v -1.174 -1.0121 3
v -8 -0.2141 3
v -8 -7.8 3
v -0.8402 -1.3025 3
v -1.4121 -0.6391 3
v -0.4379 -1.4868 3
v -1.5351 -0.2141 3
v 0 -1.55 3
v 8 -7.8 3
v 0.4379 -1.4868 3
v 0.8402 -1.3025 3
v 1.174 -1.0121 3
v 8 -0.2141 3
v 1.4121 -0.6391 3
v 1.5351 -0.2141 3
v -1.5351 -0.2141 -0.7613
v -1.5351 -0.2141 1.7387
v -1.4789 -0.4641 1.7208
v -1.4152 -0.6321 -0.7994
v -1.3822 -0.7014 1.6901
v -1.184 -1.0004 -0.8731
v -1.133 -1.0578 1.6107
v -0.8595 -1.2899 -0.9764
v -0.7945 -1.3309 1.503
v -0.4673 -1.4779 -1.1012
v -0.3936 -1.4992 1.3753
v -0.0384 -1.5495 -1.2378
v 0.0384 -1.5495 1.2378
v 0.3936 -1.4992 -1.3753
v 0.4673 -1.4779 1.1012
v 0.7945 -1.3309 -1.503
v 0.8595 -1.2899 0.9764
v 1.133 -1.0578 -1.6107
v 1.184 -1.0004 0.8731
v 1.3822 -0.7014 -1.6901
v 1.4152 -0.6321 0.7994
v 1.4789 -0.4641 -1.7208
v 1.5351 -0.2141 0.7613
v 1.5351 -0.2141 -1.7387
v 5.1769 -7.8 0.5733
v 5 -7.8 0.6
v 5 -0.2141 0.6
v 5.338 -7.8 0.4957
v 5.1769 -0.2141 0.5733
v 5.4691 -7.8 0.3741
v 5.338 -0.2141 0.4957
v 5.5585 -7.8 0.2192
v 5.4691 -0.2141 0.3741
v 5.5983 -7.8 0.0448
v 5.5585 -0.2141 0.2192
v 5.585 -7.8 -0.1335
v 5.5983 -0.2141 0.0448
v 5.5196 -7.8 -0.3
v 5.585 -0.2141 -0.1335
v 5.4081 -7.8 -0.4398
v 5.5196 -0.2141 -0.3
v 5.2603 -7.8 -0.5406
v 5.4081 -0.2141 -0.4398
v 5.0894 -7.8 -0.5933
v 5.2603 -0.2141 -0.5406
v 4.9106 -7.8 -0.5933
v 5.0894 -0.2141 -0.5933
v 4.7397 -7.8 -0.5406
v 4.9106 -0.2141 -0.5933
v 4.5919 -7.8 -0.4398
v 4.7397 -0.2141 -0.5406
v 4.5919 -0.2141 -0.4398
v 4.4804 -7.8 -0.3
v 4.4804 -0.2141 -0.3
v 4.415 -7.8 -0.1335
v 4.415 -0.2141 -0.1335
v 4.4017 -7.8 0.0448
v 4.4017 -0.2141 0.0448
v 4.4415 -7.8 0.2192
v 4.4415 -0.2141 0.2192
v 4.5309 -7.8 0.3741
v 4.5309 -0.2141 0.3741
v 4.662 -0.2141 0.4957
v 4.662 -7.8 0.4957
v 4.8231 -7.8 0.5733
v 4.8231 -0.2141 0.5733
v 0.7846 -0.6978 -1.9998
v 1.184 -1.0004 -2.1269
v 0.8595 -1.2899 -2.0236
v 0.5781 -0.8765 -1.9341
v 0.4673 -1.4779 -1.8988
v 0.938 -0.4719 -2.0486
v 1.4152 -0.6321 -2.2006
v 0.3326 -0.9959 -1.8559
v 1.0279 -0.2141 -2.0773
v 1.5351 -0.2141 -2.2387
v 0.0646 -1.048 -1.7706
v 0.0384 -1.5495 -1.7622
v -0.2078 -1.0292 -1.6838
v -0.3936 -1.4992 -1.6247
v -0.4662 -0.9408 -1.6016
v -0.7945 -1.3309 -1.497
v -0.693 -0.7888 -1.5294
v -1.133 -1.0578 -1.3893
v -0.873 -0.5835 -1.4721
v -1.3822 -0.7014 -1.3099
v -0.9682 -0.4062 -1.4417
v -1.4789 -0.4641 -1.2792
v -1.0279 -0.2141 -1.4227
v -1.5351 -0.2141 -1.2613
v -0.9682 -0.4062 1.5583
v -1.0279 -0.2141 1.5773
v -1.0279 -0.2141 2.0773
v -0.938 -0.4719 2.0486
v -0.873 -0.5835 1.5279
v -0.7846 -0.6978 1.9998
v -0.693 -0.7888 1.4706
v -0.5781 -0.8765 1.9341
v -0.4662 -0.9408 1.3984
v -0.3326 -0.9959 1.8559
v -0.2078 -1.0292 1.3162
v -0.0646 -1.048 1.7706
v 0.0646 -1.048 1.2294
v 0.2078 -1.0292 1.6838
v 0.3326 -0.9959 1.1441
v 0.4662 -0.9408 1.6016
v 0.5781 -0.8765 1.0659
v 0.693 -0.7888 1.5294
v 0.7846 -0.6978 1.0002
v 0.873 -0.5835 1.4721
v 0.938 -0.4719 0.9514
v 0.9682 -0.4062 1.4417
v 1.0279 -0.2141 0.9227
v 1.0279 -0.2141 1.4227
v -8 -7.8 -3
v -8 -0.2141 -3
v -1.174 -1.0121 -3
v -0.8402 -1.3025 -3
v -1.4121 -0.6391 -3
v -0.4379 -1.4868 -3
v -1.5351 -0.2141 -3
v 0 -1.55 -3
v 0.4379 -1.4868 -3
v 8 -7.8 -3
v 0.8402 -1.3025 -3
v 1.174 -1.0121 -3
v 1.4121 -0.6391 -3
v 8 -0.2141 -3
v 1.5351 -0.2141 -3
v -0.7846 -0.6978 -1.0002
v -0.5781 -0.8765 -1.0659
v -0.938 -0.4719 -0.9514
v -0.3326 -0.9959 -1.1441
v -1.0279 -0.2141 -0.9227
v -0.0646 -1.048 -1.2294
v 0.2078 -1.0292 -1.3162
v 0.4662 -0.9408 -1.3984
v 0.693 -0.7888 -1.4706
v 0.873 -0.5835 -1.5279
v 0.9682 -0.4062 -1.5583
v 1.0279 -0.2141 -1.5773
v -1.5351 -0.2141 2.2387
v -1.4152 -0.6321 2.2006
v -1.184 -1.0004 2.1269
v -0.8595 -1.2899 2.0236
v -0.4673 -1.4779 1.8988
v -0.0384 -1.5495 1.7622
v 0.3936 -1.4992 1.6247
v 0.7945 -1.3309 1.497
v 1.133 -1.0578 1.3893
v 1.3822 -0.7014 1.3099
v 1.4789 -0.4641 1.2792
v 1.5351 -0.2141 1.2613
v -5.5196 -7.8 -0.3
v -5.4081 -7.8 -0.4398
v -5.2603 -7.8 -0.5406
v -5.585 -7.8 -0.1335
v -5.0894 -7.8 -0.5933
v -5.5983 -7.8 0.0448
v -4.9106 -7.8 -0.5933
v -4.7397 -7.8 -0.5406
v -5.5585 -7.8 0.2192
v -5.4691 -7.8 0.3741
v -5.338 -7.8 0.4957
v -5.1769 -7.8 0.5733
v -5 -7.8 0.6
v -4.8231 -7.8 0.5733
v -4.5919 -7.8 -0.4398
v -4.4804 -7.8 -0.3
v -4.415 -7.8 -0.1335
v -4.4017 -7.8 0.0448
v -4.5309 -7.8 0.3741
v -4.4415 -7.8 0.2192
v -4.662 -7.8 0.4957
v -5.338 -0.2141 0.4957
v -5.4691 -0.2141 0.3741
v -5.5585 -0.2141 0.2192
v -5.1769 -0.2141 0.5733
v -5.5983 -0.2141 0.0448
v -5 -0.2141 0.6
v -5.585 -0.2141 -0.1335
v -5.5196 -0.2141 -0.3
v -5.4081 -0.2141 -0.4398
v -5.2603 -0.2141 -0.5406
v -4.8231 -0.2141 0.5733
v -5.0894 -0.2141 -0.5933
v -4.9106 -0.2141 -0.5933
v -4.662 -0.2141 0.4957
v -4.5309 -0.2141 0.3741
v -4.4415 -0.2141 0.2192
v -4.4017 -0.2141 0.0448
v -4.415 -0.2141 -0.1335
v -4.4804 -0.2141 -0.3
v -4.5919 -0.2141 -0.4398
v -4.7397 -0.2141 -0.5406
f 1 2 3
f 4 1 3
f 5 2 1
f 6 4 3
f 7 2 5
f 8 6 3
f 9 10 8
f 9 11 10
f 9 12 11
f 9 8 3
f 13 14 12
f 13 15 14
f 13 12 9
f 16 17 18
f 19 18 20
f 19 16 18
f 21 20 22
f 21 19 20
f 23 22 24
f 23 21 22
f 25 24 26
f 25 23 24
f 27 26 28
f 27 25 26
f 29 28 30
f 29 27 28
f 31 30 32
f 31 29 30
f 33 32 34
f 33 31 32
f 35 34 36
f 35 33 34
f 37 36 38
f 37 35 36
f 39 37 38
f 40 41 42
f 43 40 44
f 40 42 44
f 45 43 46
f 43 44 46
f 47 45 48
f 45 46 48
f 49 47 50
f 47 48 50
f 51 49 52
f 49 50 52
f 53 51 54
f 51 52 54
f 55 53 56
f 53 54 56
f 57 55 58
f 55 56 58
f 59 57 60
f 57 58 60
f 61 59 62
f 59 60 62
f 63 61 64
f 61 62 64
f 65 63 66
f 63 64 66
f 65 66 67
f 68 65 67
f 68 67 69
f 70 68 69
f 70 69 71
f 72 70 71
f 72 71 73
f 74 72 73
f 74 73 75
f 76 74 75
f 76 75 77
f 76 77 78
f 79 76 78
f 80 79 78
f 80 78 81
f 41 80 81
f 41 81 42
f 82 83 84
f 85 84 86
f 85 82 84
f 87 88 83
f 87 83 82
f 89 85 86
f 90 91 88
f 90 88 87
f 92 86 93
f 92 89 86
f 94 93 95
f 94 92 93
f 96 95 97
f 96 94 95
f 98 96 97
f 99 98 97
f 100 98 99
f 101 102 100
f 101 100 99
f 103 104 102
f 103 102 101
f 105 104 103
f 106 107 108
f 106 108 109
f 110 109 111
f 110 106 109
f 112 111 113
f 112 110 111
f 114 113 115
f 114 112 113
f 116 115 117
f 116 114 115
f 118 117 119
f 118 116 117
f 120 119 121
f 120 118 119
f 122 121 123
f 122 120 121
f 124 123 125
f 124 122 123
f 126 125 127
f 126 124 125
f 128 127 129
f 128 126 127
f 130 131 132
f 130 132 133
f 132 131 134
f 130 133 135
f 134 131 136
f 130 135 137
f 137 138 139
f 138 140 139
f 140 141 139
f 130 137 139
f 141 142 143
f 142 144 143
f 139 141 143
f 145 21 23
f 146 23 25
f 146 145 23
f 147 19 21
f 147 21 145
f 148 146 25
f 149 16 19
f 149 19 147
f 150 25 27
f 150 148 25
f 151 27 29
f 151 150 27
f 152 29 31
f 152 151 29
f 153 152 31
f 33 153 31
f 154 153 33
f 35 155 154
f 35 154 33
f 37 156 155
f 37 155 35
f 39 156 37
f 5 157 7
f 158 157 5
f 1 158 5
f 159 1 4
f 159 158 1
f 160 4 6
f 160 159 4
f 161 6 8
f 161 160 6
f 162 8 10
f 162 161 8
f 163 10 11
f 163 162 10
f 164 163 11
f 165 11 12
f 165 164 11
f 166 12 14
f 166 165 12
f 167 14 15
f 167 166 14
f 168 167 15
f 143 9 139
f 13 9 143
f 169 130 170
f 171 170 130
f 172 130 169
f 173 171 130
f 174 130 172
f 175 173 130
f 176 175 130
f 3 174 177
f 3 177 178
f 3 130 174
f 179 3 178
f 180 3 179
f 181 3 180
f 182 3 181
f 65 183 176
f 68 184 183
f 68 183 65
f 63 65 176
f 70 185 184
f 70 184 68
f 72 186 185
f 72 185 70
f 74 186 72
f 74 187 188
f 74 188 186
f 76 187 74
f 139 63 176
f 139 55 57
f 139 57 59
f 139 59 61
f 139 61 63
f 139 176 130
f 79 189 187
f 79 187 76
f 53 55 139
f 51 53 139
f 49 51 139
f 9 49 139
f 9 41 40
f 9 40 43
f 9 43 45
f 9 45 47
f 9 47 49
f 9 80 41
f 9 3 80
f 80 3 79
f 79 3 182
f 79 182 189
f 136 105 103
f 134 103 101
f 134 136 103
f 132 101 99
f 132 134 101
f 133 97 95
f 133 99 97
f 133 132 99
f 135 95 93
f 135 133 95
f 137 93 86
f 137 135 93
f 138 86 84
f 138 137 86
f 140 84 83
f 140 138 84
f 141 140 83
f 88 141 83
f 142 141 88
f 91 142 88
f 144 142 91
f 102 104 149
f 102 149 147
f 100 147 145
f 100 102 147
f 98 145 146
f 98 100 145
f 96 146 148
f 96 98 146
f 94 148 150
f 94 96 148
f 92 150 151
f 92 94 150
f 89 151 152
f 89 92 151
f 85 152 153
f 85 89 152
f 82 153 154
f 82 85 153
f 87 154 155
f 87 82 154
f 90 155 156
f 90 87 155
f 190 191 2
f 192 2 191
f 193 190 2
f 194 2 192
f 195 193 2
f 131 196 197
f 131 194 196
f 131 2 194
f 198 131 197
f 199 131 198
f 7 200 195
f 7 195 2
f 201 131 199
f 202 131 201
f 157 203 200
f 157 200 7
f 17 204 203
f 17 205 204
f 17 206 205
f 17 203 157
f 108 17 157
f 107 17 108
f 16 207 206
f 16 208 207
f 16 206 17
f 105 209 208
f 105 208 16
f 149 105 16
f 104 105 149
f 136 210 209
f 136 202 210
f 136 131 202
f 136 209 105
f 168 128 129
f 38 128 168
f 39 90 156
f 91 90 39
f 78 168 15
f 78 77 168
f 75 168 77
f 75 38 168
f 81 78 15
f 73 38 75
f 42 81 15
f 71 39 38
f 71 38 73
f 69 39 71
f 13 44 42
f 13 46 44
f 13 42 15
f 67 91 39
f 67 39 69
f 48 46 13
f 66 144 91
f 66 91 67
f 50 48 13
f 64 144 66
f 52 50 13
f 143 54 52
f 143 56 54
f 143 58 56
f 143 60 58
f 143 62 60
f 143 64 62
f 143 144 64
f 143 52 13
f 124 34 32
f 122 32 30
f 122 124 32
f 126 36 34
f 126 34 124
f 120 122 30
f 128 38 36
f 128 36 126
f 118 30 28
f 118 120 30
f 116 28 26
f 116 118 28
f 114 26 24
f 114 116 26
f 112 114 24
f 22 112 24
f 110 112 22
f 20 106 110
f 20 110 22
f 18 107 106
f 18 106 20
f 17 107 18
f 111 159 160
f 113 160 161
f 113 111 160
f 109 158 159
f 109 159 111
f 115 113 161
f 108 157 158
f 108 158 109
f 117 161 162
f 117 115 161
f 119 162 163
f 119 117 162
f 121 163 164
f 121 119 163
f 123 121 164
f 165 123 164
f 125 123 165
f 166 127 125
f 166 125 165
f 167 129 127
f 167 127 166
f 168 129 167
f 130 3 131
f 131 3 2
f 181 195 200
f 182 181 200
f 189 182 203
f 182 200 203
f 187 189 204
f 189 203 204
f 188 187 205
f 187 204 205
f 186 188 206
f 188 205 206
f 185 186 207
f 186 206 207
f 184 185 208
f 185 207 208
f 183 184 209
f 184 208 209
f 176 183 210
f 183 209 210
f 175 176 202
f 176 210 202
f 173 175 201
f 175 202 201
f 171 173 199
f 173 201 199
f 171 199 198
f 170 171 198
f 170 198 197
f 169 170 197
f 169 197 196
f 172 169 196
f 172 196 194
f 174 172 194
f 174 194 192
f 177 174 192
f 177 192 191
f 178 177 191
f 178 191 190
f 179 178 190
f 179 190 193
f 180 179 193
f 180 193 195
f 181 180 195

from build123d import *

# Parameters (mm, degrees)
SKETCH_1_W               = 16
SKETCH_1_H               = 16
SKETCH_1_R               = 1.55
EXTRUDE_1_DEPTH          = 3
EXTRUDE_2_DEPTH          = 8
CUT_EXTRUDE_2_DEPTH      = 12.704699911
CUT_EXTRUDE_2_DEPTH_BACK = 12.704699911
SKETCH_8_R               = 0.6
CUT_EXTRUDE_3_DEPTH      = 12.704699911
CUT_EXTRUDE_START        = -0.2
SKETCH_10_W              = 16
SKETCH_10_H              = 6
SKETCH_10_R              = 0.6
CUT_EXTRUDE_7_DEPTH      = 0.2


with BuildPart() as part:
    # 草图1 → 凸台-拉伸1 (new, symmetric)
    with BuildSketch(Plane.XY):
        Rectangle(SKETCH_1_W, SKETCH_1_H)
        Circle(SKETCH_1_R, mode=Mode.SUBTRACT)
    extrude(amount=EXTRUDE_1_DEPTH, both=True)

    # 草图6 → 凸台-拉伸2 (add)
    with BuildSketch(Plane(origin=(0, 0, 0), x_dir=(1, 0, 0), z_dir=(0, 1, 0))):
        Polygon((-1.55, -1.743476048), (-1.55, -2.243476048), (1.55, -1.256523952), (1.55, -0.756523952), align=None)
        Polygon((-1.55, 1.256523952), (-1.55, 0.756523952), (1.55, 1.743476048), (1.55, 2.243476048), align=None)
    extrude(amount=-EXTRUDE_2_DEPTH)

    # 草图7 → 切除-拉伸2 (cut, two sides: drawn at the far end of the back side and taken through both)
    with BuildSketch(Plane.XY.offset(-CUT_EXTRUDE_2_DEPTH_BACK)):
        with BuildLine():
            Line((-8, -0.214092961), (-1.027941732, -0.214092961))
            ThreePointArc((-1.027941732, -0.214092961), (-0.107613153, 1.044470875), (1.05, 0))
            ThreePointArc((1.05, 0), (1.044470875, -0.107613153), (1.027941732, -0.214092961))
            Line((1.027941732, -0.214092961), (8, -0.214092961))
            Line((8, -0.214092961), (8, 8))
            Line((8, 8), (-8, 8))
            Line((-8, 8), (-8, -0.214092961))
        make_face()
        with BuildLine():
            Line((1.027941732, -0.214092961), (0, 0))
            Line((0, 0), (-1.027941732, -0.214092961))
            ThreePointArc((-1.027941732, -0.214092961), (0, -1.05), (1.027941732, -0.214092961))
        make_face()
        with BuildLine():
            Line((-1.027941732, -0.214092961), (0, 0))
            Line((0, 0), (1.027941732, -0.214092961))
            ThreePointArc((1.027941732, -0.214092961), (1.044470875, -0.107613153), (1.05, 0))
            ThreePointArc((1.05, 0), (-0.107613153, 1.044470875), (-1.027941732, -0.214092961))
        make_face()
    extrude(amount=CUT_EXTRUDE_2_DEPTH + CUT_EXTRUDE_2_DEPTH_BACK, mode=Mode.SUBTRACT)

    # 草图8 → 切除-拉伸3 (cut, through all)
    with BuildSketch(Plane(origin=(0, 0, 0), x_dir=(1, 0, 0), z_dir=(0, 1, 0))):
        with Locations(Location((-5, 0, 0), (0, 0, 270))):
            Circle(SKETCH_8_R)
        with Locations(Location((5, 0, 0), (0, 0, 270))):
            Circle(SKETCH_8_R)
    extrude(amount=-CUT_EXTRUDE_3_DEPTH, mode=Mode.SUBTRACT)

    # 草图10 → 切除-拉伸7 (cut)
    with BuildSketch(Plane.XZ.offset(8).offset(CUT_EXTRUDE_START)):
        Rectangle(SKETCH_10_W, SKETCH_10_H)
        with Locations(Location((-5, 0, 0), (0, 0, 180))):
            Circle(SKETCH_10_R, mode=Mode.SUBTRACT)
        with Locations((5, 0)):
            Circle(SKETCH_10_R, mode=Mode.SUBTRACT)
    extrude(amount=CUT_EXTRUDE_7_DEPTH, mode=Mode.SUBTRACT)


solid = part.part
